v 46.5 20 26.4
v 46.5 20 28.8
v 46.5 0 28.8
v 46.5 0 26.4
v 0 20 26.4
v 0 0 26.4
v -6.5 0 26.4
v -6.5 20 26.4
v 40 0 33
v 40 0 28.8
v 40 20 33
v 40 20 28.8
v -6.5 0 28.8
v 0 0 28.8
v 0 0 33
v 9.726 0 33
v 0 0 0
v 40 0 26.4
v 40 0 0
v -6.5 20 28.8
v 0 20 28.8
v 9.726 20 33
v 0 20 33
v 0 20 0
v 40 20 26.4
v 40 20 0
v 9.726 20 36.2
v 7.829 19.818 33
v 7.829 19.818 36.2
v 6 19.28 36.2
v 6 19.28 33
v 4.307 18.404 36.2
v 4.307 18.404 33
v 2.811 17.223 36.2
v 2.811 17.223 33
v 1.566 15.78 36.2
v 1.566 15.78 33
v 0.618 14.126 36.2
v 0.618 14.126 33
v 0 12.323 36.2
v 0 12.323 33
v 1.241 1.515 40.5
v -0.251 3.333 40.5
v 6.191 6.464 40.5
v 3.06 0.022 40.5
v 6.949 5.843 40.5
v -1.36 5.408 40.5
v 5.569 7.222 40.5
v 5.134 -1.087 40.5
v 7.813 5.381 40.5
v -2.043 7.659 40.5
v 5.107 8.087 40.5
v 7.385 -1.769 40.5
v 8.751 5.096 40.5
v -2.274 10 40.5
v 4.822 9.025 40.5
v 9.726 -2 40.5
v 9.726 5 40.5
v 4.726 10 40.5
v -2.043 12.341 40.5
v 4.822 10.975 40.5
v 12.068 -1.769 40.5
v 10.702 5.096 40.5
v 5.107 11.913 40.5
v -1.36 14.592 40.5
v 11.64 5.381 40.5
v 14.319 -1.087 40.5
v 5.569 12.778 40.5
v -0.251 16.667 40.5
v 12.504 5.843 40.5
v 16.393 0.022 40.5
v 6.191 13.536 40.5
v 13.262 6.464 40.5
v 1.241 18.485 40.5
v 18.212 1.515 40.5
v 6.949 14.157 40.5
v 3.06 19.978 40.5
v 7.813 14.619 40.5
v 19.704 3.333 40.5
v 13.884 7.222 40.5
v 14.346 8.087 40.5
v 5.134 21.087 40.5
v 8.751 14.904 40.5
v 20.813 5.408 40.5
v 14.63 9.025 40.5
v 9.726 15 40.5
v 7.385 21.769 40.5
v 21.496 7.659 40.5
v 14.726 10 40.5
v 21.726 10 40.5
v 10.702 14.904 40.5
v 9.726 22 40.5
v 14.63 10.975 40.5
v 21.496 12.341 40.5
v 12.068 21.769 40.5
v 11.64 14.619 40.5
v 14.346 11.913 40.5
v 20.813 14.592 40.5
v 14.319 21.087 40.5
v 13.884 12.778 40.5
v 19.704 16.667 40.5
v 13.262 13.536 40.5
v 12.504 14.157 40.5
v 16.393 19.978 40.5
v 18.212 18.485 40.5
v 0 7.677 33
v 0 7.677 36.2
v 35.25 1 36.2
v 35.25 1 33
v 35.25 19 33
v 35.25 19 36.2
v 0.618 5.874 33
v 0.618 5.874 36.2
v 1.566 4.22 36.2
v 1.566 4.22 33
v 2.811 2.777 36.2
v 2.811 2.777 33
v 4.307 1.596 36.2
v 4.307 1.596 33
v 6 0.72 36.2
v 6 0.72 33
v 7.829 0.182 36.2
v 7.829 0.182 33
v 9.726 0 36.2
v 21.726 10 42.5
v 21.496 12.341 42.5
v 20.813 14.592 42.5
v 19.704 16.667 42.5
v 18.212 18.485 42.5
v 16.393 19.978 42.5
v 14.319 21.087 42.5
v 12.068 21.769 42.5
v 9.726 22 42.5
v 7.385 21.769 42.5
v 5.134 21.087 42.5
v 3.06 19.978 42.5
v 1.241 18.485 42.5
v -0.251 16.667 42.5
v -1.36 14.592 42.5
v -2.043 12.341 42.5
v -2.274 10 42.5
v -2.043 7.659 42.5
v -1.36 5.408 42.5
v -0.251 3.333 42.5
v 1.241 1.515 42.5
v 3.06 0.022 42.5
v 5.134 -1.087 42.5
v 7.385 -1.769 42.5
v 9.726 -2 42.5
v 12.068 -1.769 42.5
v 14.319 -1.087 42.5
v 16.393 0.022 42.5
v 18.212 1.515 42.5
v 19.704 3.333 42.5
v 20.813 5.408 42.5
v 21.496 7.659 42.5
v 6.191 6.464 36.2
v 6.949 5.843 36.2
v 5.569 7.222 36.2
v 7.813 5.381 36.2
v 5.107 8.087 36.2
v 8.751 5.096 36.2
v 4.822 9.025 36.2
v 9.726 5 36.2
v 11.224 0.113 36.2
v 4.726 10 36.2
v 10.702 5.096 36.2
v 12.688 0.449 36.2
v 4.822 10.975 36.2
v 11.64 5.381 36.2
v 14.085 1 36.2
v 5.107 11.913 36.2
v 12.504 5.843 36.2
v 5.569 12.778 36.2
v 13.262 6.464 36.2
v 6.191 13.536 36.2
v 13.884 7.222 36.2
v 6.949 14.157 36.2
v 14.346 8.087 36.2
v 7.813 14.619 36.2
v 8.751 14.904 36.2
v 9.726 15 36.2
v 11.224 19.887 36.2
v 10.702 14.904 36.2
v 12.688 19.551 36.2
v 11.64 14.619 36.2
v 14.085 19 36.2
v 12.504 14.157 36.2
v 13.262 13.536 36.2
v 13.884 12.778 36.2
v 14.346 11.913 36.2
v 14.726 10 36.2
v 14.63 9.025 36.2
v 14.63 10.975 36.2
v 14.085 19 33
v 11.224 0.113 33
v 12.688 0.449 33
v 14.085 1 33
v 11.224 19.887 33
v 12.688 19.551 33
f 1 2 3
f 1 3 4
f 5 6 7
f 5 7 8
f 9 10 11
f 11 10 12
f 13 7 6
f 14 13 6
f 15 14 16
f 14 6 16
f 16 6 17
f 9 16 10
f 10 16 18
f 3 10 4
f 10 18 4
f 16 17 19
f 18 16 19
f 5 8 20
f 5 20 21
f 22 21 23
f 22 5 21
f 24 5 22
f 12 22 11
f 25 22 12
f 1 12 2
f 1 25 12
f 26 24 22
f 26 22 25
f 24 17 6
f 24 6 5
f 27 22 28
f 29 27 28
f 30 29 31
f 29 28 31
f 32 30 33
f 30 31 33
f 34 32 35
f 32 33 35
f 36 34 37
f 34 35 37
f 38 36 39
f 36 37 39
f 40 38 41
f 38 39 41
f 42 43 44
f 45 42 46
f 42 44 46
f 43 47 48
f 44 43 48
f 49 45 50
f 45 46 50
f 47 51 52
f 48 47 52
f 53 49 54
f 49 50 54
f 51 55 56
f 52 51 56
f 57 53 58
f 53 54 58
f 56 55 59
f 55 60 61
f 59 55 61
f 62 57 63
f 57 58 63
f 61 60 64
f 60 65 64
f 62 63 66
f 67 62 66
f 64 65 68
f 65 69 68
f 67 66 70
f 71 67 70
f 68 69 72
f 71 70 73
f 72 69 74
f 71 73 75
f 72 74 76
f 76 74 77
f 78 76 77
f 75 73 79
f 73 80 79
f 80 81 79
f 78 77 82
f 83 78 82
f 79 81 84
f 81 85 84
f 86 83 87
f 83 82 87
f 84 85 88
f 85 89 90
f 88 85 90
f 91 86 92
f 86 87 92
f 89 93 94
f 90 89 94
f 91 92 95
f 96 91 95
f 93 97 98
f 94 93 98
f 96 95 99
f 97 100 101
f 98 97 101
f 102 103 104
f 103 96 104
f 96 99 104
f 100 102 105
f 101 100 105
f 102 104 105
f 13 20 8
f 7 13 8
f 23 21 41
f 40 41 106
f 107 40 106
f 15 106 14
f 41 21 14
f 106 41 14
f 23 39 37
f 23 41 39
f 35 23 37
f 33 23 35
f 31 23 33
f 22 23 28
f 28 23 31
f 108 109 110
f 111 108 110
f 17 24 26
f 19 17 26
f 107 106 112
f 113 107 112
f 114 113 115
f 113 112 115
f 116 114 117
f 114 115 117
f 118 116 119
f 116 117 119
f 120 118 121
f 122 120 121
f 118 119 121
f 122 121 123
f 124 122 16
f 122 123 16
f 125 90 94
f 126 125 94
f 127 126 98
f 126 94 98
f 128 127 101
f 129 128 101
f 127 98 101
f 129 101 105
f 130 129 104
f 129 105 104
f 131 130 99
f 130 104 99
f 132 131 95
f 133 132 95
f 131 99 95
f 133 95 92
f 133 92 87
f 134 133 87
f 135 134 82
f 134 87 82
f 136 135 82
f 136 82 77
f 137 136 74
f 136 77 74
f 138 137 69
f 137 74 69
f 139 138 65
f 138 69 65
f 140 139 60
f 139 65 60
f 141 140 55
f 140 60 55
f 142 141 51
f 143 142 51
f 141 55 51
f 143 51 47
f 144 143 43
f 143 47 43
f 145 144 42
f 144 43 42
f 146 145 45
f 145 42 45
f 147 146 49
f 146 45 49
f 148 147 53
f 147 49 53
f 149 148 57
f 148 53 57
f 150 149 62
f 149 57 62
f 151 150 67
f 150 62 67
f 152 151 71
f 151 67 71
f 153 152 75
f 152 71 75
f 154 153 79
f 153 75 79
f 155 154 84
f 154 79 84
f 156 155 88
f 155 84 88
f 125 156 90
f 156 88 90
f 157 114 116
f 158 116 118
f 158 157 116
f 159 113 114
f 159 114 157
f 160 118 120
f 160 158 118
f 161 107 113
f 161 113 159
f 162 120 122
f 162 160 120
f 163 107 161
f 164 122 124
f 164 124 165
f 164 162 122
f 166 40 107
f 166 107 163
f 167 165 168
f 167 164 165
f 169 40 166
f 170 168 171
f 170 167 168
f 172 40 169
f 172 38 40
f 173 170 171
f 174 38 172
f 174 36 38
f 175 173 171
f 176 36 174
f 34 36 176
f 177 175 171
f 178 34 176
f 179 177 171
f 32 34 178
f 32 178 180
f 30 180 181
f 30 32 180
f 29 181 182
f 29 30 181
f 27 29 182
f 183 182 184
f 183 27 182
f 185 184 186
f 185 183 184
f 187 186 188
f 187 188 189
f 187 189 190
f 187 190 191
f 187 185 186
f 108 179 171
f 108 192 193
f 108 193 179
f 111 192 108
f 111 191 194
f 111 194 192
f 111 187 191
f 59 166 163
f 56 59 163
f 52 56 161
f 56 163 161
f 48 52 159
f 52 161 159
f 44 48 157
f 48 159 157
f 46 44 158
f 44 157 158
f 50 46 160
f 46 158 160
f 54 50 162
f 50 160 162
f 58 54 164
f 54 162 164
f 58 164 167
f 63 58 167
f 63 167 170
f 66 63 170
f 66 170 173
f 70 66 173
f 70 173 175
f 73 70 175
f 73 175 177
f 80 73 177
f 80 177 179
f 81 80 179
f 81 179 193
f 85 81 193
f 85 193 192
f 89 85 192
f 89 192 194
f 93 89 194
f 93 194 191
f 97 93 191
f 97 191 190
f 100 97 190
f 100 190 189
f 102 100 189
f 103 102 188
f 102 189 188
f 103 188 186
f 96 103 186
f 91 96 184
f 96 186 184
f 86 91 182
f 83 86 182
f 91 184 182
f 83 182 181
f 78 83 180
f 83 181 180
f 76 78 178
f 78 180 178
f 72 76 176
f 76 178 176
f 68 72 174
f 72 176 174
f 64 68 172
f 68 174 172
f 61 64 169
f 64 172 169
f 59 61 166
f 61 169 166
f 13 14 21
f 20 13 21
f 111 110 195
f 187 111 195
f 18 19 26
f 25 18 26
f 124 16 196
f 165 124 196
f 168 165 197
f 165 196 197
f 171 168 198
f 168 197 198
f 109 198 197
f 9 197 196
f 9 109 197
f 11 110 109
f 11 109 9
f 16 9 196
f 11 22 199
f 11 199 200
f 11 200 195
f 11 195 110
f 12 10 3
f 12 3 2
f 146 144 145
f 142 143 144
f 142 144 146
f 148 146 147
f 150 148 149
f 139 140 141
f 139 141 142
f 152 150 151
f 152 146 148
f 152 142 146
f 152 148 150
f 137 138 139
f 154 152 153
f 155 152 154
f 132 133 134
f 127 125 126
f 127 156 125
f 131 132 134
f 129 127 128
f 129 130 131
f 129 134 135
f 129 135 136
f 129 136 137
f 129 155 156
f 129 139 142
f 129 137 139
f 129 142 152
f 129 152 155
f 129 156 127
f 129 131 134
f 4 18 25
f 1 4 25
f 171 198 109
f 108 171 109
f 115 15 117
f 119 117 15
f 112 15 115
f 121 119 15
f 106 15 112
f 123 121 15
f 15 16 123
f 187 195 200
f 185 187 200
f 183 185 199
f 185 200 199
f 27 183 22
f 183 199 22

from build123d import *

# Parameters (mm, degrees)
SKETCH1_W           = 40
SKETCH1_H           = 20
BOSS_EXTRUDE1_DEPTH = 33
SKETCH3_W           = 2.4
SKETCH3_H           = 20
BOSS_EXTRUDE2_DEPTH = 6.5
SKETCH3_2_W         = 2.4
SKETCH3_2_H         = 20
BOSS_EXTRUDE3_DEPTH = 46.5
SKETCH4_R           = 5
BOSS_EXTRUDE4_DEPTH = 7.5
SKETCH5_R           = 12
BOSS_EXTRUDE5_DEPTH = 2
SKETCH6_R           = 5
BOSS_EXTRUDE6_DEPTH = 3.2


with BuildPart() as part:
    # Sketch1 → Boss-Extrude1 (new body)
    with BuildSketch(Plane.XY):
        with Locations((20, 10)):
            Rectangle(SKETCH1_W, SKETCH1_H)
    extrude(amount=BOSS_EXTRUDE1_DEPTH)

    # Sketch3 → Boss-Extrude2 (add)
    with BuildSketch(Plane(origin=(40, 0, 0), x_dir=(0, 0, -1), z_dir=(1, 0, 0))):
        with Locations((-27.6, 10)):
            Rectangle(SKETCH3_W, SKETCH3_H)
    extrude(amount=BOSS_EXTRUDE2_DEPTH)

    # Sketch3<2> → Boss-Extrude3 (add)
    with BuildSketch(Plane(origin=(40, 0, 0), x_dir=(0, 0, -1), z_dir=(1, 0, 0))):
        with Locations((-27.6, 10)):
            Rectangle(SKETCH3_2_W, SKETCH3_2_H)
    extrude(amount=-BOSS_EXTRUDE3_DEPTH)

    # Sketch4 → Boss-Extrude4 (add)
    with BuildSketch(Plane.XY.offset(33)):
        with Locations((9.726417673, 10)):
            Circle(SKETCH4_R)
    extrude(amount=BOSS_EXTRUDE4_DEPTH)

    # Sketch5 → Boss-Extrude5 (add)
    with BuildSketch(Plane.XY.offset(40.5)):
        with Locations((9.726417673, 10)):
            Circle(SKETCH5_R)
    extrude(amount=BOSS_EXTRUDE5_DEPTH)

    # Sketch6 → Boss-Extrude6 (add)
    with BuildSketch(Plane.XY.offset(33)):
        with BuildLine():
            Line((35.25, 1), (35.25, 19))
            Line((35.25, 19), (14.085316617, 19))
            ThreePointArc((14.085316617, 19), (11.962485651, 19.746794345), (9.726417673, 20))
            ThreePointArc((9.726417673, 20), (3.530895586, 17.849554514), (0, 12.323101213))
            Line((0, 12.323101213), (0, 7.676898787))
            ThreePointArc((0, 7.676898787), (3.530895586, 2.150445486), (9.726417673, 0))
            ThreePointArc((9.726417673, 0), (11.962485651, 0.253205655), (14.085316617, 1))
            Line((14.085316617, 1), (35.25, 1))
        make_face()
        with Locations((9.726417673, 10)):
            Circle(SKETCH6_R, mode=Mode.SUBTRACT)
    extrude(amount=BOSS_EXTRUDE6_DEPTH)


solid = part.part
